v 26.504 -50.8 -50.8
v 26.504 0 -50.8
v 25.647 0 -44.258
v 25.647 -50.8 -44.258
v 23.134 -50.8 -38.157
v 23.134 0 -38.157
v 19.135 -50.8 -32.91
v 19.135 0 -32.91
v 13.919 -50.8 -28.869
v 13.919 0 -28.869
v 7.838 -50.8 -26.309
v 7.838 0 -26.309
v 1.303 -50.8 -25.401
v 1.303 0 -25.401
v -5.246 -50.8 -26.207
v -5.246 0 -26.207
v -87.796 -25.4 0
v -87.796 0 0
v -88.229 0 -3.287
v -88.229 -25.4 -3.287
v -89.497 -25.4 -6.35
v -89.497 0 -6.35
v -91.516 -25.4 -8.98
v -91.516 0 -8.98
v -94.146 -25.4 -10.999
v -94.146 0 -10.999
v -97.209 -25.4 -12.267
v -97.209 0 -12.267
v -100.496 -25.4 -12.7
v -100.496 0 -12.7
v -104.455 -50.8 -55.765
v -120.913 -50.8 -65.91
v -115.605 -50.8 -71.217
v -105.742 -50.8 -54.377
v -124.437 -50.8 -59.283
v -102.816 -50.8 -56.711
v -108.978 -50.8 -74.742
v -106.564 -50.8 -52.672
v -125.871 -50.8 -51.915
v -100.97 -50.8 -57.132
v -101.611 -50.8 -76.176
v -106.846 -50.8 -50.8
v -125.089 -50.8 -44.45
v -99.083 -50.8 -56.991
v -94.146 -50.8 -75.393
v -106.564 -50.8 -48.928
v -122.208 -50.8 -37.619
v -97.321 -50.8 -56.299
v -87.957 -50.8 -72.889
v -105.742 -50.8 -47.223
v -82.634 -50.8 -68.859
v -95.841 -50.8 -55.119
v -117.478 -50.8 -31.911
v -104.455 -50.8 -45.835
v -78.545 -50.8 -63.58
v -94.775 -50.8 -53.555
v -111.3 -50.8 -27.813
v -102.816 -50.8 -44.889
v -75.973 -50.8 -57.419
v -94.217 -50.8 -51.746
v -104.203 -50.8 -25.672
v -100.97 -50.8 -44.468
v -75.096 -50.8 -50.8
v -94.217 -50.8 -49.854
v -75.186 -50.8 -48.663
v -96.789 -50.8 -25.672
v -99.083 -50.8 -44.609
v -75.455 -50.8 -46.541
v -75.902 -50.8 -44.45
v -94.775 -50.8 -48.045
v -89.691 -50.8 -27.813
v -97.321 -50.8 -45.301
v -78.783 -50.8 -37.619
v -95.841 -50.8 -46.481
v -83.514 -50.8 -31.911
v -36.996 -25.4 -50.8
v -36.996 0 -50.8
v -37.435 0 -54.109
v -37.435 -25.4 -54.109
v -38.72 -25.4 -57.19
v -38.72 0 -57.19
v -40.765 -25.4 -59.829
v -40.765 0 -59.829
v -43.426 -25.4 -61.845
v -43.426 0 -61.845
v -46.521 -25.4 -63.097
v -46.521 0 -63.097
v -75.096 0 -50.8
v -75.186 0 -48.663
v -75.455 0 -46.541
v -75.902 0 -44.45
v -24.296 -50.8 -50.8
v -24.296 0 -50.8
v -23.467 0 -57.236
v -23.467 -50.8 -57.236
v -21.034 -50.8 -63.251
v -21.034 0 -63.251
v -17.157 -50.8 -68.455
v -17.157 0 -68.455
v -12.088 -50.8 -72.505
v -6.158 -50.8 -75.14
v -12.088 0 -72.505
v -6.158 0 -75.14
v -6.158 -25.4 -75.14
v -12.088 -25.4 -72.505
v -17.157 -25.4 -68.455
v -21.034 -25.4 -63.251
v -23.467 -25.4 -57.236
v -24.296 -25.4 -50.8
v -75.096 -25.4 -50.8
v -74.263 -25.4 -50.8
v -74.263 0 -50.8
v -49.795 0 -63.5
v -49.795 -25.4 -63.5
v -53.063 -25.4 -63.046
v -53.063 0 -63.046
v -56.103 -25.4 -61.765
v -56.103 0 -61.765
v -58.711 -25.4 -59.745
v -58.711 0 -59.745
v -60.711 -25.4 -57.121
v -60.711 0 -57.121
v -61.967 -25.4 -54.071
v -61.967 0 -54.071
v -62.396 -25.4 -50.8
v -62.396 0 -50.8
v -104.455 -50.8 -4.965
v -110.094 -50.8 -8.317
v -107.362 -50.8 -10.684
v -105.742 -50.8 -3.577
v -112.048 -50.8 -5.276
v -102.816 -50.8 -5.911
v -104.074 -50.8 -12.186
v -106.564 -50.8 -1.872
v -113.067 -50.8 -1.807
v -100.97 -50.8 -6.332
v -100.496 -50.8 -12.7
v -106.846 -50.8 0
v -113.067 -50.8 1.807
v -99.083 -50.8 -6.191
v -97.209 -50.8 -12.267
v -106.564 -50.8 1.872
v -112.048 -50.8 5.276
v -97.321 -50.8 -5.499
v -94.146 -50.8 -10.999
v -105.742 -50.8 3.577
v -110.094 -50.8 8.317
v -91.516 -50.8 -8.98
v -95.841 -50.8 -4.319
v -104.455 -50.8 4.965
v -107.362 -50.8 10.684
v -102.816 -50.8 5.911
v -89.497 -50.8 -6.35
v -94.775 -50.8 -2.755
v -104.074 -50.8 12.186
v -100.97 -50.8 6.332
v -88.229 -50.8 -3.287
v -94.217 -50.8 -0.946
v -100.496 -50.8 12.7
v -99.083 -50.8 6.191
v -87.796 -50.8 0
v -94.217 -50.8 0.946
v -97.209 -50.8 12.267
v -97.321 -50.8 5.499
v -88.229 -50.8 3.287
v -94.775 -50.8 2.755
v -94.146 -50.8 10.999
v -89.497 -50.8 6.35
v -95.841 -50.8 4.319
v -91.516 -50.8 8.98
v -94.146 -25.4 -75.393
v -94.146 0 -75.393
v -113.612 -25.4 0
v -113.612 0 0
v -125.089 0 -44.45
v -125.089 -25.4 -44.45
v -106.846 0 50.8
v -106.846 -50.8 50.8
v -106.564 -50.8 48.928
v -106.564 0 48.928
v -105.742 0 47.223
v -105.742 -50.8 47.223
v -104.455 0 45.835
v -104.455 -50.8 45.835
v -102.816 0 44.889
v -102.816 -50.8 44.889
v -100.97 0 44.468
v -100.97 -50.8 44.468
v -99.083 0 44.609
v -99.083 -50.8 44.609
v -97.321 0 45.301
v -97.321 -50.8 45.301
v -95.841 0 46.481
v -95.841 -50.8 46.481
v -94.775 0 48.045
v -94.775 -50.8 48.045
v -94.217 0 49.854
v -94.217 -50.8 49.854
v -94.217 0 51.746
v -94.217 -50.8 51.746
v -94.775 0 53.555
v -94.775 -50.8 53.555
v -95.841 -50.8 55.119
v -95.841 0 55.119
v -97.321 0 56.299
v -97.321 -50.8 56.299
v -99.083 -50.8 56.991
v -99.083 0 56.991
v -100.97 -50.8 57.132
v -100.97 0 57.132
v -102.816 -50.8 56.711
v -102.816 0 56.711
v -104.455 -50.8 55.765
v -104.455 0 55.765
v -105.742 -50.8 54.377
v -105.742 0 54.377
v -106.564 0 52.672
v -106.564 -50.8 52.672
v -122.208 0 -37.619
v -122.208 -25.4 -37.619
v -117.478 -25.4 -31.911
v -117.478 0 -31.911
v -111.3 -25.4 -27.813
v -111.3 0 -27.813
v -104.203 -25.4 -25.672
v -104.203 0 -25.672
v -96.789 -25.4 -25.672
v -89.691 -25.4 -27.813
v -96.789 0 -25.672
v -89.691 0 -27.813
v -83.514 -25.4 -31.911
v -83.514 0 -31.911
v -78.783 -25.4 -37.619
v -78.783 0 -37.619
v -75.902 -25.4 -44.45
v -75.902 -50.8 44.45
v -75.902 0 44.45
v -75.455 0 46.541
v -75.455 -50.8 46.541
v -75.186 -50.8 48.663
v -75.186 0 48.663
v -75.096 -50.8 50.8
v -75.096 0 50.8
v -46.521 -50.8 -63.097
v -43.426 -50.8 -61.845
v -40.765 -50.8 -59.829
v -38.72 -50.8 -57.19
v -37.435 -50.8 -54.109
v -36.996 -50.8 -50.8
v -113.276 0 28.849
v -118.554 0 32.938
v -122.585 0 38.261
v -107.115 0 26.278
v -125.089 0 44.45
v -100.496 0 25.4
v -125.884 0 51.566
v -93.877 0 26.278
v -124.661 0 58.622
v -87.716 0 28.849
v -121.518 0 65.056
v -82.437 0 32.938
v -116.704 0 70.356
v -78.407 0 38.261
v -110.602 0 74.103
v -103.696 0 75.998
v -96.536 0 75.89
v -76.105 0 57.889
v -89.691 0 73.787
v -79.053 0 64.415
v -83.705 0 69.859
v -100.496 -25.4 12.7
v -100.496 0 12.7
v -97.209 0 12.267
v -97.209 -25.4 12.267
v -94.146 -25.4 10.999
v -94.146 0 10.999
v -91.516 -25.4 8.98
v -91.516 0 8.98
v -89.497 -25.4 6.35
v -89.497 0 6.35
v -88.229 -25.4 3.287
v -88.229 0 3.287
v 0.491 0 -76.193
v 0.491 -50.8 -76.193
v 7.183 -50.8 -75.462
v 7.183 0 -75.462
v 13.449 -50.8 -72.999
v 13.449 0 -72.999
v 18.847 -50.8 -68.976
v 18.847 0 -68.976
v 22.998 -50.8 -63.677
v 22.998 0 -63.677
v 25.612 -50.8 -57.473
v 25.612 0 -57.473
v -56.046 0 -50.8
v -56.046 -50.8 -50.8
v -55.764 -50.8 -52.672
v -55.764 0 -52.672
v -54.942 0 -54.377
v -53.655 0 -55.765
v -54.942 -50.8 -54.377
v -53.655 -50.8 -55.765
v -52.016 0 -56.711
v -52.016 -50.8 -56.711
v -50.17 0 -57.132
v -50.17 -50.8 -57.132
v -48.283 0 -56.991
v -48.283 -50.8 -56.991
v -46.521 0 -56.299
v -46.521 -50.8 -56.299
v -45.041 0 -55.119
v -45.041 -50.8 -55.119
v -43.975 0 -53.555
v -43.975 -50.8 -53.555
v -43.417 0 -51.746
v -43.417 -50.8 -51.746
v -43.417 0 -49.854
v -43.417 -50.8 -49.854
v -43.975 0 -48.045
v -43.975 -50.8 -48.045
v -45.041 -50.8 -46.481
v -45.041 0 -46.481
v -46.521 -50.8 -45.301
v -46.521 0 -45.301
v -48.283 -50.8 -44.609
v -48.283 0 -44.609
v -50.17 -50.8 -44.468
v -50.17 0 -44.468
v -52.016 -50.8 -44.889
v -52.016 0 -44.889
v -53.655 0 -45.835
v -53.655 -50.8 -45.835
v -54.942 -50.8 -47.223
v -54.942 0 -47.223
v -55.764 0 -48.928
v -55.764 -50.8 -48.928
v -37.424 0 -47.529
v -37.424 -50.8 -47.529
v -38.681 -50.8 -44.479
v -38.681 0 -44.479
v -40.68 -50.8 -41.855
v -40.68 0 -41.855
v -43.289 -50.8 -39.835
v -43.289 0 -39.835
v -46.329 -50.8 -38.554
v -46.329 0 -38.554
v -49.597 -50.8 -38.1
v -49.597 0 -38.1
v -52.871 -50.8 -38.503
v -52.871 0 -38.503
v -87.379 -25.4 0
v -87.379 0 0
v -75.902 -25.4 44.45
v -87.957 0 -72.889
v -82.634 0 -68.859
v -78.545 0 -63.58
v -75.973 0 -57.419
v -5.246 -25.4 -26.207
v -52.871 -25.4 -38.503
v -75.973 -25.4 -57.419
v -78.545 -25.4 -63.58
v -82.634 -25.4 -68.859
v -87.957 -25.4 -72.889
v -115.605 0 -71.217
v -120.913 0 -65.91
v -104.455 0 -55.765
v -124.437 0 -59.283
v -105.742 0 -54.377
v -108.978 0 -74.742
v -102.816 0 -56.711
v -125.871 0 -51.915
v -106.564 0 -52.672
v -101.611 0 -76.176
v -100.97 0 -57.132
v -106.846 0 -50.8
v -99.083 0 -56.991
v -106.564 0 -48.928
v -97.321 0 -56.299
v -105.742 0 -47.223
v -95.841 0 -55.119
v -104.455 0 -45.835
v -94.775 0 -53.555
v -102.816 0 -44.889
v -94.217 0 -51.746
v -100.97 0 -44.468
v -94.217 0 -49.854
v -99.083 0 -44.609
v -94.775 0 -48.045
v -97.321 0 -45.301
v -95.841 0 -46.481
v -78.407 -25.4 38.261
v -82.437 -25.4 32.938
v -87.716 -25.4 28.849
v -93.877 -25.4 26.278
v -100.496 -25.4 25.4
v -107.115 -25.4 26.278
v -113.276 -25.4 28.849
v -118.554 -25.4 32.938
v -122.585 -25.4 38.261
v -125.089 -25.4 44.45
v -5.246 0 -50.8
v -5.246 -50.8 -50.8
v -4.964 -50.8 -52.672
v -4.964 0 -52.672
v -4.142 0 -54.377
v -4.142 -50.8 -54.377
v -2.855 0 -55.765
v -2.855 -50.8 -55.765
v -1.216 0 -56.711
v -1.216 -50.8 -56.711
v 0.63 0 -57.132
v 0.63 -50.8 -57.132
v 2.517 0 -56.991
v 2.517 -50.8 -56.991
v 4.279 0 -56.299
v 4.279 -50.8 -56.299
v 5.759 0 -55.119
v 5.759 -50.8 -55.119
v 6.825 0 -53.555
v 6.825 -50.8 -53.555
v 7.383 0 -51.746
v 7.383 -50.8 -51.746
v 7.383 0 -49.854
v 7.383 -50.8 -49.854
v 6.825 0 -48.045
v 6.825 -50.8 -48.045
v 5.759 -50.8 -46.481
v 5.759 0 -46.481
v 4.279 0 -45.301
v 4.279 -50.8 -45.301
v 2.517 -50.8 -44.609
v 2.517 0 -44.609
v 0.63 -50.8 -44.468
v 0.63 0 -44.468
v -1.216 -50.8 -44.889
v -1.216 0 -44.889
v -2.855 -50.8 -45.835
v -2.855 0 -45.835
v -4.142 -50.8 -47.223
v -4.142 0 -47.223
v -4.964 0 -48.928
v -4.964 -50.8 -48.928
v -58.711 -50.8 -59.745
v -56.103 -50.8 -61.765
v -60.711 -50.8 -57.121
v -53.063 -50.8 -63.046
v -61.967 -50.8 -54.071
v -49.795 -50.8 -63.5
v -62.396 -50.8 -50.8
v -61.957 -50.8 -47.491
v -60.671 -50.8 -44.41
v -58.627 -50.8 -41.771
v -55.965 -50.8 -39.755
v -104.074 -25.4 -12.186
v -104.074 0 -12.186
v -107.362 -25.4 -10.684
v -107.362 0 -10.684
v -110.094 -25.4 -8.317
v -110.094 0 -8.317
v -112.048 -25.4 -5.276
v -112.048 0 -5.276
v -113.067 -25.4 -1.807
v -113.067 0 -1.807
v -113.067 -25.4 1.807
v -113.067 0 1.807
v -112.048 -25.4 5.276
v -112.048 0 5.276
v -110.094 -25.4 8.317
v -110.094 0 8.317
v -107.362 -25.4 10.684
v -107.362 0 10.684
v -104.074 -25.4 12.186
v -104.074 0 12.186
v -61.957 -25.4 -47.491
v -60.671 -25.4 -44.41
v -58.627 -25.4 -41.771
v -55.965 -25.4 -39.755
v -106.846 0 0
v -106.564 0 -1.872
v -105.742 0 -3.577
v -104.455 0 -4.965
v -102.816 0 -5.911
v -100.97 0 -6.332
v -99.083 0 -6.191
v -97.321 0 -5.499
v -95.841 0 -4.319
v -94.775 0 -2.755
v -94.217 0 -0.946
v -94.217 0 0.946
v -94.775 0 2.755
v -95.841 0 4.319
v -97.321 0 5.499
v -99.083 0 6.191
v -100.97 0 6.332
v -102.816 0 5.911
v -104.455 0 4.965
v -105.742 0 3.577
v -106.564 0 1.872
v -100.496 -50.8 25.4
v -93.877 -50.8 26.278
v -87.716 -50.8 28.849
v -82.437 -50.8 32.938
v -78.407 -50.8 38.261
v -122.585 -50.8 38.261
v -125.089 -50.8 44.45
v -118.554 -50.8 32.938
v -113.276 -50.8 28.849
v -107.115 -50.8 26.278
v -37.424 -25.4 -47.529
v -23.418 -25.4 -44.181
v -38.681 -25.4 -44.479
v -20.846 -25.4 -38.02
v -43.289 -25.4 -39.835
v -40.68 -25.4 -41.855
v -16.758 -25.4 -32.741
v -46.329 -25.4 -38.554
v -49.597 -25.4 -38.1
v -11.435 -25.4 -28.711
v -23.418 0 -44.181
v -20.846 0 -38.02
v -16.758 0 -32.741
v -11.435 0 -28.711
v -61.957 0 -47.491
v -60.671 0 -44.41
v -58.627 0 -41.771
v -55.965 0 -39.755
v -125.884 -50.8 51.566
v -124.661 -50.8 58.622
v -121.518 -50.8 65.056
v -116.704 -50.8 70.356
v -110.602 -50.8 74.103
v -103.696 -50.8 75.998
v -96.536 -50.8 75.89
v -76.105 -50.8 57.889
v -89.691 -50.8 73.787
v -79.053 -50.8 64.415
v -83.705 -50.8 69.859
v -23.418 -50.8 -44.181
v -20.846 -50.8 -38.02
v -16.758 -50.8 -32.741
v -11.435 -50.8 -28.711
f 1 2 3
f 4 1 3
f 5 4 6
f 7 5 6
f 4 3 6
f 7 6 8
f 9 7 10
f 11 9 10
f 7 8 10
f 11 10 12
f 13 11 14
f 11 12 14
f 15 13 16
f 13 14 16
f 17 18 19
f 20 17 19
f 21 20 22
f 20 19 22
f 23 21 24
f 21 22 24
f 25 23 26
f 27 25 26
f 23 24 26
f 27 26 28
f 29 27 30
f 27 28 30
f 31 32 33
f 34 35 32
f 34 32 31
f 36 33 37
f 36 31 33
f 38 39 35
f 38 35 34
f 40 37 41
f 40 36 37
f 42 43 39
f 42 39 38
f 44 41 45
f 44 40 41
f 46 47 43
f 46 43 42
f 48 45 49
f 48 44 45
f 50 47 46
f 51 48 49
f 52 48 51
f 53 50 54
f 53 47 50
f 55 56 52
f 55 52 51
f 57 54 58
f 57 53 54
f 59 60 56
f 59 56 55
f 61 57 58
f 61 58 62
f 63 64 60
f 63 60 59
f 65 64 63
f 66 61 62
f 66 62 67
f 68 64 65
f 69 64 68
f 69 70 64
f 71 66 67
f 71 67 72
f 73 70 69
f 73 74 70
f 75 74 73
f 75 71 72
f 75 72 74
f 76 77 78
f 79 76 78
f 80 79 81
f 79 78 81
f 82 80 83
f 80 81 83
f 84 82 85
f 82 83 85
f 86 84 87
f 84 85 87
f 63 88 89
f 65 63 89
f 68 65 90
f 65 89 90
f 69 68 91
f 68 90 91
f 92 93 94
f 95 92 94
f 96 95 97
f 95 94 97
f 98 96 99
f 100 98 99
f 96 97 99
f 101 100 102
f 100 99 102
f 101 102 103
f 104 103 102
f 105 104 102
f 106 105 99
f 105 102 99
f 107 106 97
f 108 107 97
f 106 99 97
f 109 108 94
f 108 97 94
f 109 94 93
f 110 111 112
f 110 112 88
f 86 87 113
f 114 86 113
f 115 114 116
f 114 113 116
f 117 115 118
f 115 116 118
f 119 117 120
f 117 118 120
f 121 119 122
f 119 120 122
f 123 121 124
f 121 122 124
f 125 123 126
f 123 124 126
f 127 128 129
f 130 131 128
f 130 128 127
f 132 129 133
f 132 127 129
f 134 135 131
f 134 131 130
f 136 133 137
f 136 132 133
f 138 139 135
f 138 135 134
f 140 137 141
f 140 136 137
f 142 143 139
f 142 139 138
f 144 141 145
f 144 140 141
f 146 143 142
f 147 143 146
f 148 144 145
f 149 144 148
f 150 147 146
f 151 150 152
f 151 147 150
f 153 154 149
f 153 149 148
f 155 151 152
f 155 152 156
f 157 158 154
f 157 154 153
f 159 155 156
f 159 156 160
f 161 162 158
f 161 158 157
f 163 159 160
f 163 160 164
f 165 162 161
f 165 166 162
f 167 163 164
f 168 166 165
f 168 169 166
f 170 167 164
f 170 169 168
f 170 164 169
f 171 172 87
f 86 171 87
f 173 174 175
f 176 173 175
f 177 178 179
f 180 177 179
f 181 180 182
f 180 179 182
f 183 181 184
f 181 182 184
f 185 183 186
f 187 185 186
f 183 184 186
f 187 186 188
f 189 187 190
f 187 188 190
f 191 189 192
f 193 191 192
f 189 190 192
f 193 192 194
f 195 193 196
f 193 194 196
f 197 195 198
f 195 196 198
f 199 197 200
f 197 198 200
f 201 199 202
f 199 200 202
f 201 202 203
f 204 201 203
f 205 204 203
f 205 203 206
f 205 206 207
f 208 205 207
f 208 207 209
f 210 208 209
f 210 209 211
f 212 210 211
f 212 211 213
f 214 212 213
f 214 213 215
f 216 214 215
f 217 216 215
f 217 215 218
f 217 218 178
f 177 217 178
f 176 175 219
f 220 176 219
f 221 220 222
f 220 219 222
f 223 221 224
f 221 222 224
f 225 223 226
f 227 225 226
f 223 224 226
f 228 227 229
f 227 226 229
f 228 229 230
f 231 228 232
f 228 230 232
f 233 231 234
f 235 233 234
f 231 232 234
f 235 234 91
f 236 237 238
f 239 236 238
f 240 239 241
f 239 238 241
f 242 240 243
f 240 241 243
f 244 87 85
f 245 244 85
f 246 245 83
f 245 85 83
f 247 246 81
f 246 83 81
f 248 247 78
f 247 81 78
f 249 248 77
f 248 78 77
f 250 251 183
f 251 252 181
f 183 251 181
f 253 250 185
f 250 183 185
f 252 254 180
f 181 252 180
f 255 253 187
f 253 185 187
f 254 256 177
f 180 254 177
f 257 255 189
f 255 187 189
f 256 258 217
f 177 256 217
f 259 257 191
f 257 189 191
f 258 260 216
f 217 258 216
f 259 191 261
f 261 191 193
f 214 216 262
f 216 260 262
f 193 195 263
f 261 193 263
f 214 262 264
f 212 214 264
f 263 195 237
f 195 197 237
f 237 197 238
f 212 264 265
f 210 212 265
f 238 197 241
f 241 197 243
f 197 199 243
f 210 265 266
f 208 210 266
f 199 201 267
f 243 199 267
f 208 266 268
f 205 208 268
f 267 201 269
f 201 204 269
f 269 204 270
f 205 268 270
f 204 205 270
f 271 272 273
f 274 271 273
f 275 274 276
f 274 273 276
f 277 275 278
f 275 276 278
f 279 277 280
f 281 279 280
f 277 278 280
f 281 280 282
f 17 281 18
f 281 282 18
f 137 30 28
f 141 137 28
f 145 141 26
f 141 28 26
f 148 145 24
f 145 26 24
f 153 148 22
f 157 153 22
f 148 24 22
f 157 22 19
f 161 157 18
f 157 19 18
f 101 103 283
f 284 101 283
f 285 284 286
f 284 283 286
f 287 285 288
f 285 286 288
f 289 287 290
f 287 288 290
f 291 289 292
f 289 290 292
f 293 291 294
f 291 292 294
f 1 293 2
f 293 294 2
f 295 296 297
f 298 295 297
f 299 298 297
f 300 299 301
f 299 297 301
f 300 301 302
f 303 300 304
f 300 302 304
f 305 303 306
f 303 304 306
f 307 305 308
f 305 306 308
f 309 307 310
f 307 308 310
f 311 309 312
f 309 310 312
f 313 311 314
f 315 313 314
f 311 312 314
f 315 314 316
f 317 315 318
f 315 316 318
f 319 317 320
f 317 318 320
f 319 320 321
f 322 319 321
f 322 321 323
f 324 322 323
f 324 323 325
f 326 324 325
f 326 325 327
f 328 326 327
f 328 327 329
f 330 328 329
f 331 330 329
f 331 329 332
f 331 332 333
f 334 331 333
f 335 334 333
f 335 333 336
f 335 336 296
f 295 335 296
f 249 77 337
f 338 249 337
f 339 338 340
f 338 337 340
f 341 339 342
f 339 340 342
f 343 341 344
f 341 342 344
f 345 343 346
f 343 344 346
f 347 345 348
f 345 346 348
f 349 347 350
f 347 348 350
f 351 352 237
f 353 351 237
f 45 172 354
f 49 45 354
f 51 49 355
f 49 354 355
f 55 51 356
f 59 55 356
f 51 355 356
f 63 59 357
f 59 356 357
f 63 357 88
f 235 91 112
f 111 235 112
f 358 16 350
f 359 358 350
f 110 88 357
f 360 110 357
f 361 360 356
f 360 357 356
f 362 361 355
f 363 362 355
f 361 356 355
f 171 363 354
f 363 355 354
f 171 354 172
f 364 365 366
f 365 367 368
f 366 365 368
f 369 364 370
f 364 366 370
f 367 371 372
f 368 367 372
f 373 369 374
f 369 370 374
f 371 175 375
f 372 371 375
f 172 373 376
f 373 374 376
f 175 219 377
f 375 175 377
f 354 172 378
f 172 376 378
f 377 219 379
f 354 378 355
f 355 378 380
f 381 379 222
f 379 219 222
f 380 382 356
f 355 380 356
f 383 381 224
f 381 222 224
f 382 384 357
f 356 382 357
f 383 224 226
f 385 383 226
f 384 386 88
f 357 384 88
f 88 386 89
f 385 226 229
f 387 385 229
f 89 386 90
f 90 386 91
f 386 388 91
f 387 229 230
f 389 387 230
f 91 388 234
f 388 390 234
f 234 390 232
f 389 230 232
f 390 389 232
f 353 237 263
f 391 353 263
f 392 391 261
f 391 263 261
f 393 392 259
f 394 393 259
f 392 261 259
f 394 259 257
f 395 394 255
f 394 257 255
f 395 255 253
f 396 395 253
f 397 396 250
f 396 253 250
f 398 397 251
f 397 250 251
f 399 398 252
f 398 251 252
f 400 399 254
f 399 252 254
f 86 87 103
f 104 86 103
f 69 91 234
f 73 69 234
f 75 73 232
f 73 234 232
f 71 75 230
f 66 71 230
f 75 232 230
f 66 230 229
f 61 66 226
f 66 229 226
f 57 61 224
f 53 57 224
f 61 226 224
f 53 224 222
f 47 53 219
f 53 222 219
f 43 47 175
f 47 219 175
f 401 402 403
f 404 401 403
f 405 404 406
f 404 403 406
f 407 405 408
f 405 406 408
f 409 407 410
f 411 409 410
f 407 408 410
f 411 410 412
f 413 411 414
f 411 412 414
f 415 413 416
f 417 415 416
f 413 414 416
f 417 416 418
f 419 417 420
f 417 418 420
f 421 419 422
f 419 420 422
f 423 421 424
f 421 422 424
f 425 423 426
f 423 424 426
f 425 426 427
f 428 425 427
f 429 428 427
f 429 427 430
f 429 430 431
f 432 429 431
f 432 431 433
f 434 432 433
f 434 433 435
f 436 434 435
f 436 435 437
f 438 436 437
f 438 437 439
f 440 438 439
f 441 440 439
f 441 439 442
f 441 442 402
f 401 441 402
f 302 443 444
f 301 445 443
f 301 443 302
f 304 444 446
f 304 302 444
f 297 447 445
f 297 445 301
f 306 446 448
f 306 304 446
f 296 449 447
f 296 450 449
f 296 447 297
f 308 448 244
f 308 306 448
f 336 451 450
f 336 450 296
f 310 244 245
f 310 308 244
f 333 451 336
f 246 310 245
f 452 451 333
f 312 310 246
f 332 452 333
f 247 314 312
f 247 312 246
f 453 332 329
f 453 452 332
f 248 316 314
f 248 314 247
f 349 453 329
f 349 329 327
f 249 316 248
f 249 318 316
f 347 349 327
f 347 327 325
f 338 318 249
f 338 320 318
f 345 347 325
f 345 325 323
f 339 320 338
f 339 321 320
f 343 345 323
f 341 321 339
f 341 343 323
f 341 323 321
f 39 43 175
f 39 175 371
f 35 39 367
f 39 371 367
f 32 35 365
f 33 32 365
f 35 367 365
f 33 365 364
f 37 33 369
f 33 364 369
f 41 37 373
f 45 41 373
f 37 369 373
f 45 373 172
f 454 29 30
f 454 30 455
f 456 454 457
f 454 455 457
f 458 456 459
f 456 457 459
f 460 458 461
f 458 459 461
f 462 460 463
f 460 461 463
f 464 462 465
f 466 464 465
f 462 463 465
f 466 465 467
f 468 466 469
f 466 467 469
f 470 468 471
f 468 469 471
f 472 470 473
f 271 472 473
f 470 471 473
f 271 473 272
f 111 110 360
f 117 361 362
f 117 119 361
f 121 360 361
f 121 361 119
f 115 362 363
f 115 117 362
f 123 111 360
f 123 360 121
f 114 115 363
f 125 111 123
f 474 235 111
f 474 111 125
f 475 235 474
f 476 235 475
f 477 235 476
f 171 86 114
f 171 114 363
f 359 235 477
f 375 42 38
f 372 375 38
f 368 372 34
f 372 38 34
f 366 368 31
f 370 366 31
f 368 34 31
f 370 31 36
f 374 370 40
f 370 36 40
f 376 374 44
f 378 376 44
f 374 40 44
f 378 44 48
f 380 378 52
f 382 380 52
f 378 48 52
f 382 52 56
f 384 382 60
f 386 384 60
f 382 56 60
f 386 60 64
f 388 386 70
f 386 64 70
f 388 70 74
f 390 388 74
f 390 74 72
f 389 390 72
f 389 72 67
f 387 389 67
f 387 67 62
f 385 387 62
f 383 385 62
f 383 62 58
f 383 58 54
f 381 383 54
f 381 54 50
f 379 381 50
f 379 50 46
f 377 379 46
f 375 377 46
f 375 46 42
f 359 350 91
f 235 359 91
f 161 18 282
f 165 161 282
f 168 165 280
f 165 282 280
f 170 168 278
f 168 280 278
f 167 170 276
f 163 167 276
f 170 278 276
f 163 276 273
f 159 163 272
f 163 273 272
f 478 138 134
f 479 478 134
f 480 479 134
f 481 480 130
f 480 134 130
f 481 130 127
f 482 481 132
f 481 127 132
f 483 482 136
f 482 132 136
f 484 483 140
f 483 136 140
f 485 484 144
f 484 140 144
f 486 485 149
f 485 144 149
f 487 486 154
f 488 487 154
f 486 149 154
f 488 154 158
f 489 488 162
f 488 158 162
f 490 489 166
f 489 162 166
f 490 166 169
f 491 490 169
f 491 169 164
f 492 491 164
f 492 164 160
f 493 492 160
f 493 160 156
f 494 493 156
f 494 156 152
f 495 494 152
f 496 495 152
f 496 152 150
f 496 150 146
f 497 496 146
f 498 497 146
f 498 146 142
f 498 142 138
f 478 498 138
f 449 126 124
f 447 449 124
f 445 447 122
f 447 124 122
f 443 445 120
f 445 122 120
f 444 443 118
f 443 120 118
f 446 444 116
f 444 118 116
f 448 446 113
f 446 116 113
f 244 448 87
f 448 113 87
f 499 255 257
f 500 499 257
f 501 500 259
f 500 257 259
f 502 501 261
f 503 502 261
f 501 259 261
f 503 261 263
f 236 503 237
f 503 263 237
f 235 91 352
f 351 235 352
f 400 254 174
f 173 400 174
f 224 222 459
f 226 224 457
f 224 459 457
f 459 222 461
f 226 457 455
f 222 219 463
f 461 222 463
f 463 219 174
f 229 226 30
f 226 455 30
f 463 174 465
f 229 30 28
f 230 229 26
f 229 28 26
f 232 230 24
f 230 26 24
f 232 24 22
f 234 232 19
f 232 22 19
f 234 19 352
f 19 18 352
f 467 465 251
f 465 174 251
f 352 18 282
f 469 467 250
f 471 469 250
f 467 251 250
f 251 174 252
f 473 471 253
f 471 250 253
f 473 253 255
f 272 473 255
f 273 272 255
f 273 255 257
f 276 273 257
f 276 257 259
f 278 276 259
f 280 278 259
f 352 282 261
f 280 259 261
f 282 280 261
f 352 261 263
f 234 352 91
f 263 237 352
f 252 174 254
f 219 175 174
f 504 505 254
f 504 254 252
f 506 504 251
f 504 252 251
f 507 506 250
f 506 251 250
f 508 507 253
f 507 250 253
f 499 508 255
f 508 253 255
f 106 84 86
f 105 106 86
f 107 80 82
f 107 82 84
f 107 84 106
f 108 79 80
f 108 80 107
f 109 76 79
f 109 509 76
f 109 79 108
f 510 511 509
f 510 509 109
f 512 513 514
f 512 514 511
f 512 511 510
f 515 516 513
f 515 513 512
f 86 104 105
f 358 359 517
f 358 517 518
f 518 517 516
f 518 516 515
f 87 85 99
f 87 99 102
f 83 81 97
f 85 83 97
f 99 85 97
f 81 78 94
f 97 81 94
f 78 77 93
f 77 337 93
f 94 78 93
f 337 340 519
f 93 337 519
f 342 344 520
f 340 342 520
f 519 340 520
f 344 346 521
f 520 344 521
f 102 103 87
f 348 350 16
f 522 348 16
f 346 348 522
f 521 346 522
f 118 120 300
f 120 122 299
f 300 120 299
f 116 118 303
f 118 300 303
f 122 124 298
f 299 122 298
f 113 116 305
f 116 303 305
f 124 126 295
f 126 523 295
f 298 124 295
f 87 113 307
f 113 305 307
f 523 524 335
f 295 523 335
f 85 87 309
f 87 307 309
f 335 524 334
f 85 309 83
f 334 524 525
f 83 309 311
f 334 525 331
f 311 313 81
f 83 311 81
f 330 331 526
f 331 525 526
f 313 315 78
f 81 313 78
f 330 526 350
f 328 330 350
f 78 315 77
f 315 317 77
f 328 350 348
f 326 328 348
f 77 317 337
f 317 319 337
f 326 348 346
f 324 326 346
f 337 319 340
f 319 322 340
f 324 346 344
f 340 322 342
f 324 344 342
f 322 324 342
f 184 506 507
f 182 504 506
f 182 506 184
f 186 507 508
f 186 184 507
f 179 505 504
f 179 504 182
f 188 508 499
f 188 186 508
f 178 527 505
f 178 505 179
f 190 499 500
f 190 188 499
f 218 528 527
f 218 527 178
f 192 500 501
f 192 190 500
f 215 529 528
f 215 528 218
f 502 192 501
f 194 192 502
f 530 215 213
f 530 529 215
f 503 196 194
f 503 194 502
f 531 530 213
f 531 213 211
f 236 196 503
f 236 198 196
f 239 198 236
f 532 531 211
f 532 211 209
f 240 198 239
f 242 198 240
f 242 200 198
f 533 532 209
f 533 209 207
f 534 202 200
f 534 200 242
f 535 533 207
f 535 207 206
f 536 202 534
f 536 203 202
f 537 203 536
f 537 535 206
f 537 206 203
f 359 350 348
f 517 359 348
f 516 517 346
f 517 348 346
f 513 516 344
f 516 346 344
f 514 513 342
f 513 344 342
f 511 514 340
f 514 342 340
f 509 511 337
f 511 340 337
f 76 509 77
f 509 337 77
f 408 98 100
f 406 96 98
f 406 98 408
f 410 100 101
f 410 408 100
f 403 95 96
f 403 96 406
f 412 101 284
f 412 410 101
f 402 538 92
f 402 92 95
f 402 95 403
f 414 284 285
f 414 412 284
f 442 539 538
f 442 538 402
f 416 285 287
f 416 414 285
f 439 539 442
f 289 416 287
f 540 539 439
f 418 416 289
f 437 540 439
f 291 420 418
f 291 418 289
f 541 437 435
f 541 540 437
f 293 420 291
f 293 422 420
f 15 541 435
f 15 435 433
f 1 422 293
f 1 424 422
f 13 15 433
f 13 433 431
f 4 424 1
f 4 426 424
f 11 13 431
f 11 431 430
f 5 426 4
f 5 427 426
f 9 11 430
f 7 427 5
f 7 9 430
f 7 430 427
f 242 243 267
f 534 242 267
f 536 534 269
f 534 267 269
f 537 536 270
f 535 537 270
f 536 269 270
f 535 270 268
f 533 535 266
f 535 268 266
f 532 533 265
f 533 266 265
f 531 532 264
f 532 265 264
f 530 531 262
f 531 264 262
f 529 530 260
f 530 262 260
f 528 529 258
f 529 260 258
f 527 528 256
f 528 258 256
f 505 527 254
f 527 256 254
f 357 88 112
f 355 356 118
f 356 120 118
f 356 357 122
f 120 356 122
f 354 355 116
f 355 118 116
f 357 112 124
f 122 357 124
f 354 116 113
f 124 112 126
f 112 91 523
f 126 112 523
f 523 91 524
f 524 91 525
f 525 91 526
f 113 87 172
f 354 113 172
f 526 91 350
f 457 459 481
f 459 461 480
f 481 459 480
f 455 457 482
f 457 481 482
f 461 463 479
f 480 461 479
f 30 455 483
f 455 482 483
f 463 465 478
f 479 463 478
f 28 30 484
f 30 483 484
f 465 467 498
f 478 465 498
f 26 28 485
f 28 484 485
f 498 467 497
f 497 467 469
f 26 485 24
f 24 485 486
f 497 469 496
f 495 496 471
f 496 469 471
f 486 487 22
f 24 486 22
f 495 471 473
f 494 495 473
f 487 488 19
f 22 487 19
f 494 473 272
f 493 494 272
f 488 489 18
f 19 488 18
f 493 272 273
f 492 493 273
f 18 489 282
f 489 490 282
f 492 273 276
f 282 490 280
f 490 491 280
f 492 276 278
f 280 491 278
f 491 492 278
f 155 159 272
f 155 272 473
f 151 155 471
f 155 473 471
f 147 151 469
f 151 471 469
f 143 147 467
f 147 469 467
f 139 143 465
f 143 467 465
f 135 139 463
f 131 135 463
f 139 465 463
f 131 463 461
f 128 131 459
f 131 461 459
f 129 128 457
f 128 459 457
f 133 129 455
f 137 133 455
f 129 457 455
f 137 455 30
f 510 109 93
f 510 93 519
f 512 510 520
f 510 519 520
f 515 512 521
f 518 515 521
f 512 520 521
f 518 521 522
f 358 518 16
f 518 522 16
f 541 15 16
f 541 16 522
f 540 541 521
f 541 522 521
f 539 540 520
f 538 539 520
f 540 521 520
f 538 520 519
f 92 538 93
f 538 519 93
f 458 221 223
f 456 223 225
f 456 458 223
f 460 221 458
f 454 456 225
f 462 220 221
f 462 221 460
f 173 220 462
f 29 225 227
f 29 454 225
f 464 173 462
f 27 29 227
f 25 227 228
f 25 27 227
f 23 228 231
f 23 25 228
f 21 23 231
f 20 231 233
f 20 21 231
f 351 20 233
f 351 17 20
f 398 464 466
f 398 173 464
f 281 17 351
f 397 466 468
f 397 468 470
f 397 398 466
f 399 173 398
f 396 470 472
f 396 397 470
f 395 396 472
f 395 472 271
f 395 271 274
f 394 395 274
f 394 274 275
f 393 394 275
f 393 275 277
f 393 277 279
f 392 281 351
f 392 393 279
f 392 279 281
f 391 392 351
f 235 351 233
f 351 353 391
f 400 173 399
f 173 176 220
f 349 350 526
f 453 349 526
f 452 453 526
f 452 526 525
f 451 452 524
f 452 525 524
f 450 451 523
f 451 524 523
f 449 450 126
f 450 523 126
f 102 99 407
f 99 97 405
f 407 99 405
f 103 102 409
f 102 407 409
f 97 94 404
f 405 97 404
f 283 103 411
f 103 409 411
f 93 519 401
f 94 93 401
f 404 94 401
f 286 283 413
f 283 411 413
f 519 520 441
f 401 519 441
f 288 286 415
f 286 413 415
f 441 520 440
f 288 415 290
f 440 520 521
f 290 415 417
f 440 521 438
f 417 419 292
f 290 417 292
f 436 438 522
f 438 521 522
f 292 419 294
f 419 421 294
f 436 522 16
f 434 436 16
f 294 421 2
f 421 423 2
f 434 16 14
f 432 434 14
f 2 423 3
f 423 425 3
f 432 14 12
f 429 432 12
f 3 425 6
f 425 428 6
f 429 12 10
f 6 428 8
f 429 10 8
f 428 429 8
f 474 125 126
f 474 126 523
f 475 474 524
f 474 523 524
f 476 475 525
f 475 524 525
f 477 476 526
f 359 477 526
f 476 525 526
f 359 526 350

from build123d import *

# Parameters (mm, degrees)
F1_DEPTH = 50.8
F2_DEPTH = 25.4
F3_D     = 12.7
F3_2_D   = 12.7
F3_3_D   = 12.7
F3_4_D   = 12.7
F3_5_D   = 12.7


with BuildPart() as f1:
    # F0 (on Front) → F1 (new body)
    with BuildSketch(Plane.XZ):
        with BuildLine():
            ThreePointArc((-100.4957760886, 25.4), (-84.9415162219, 30.7195368579), (-75.9023318401, 44.45))
            ThreePointArc((-75.9023318401, 44.45), (-75.2982218034, 47.5994909709), (-75.0957760886, 50.8))
            ThreePointArc((-75.0957760886, 50.8), (-103.6962847293, 75.9975543345), (-125.0892205327, 44.4500007579))
            ThreePointArc((-125.0892205327, 44.4500007579), (-116.0500362647, 30.7195370976), (-100.4957760886, 25.4))
        make_face()
    extrude(amount=F1_DEPTH)

    # F3 (through all)
    with Locations(Plane(origin=(0, 0, 0), x_dir=(1, 0, 0), z_dir=(0, 1, 0))):
        with Locations((-100.4957760886, -50.8), (-100.4957760886, 50.8), (-100.4957760886, 0), (-49.6957760886, 50.8), (1.1042239114, 50.8)):
            Hole(F3_D / 2)


with BuildPart() as f1b:
    # F0 (on Front) → F1, piece 2 (new body)
    with BuildSketch(Plane.XZ):
        with BuildLine():
            ThreePointArc((-100.4957760886, 12.7), (-113.1957760886, 0), (-100.4957760886, -12.7))
            Line((-100.4957760886, -12.7), (-100.4957760886, 0))
            Line((-100.4957760886, 0), (-100.4957760886, 12.7))
        make_face()
        with BuildLine():
            Line((-100.4957760886, 0), (-100.4957760886, -12.7))
            ThreePointArc((-100.4957760886, -12.7), (-91.5155199675, -8.9802561211), (-87.7957760886, 0))
            ThreePointArc((-87.7957760886, 0), (-91.5155199675, 8.9802561211), (-100.4957760886, 12.7))
            Line((-100.4957760886, 12.7), (-100.4957760886, 0))
        make_face()
    extrude(amount=F1_DEPTH)

    # F3#2 (through all)
    with Locations(Plane(origin=(0, 0, 0), x_dir=(1, 0, 0), z_dir=(0, 1, 0))):
        with Locations((-100.4957760886, -50.8), (-100.4957760886, 50.8), (-100.4957760886, 0), (-49.6957760886, 50.8), (1.1042239114, 50.8)):
            Hole(F3_2_D / 2)


with BuildPart() as f1c:
    # F0 (on Front) → F1, piece 3 (new body)
    with BuildSketch(Plane.XZ):
        with BuildLine():
            Line((-100.4957760886, -25.4), (-100.4957760886, -50.8))
            Line((-100.4957760886, -50.8), (-75.0957760886, -50.8))
            ThreePointArc((-75.0957760886, -50.8), (-75.2982218034, -47.5994909709), (-75.9023318401, -44.45))
            ThreePointArc((-75.9023318401, -44.45), (-84.9415162219, -30.7195368579), (-100.4957760886, -25.4))
        make_face()
        with BuildLine():
            Line((-75.0957760886, -50.8), (-100.4957760886, -50.8))
            Line((-100.4957760886, -50.8), (-100.4957760886, -25.4))
            ThreePointArc((-100.4957760886, -25.4), (-116.0500359552, -30.7195368579), (-125.089220337, -44.45))
            ThreePointArc((-125.089220337, -44.45), (-118.4562883307, -68.7605122421), (-94.1457760886, -75.3934442484))
            ThreePointArc((-94.1457760886, -75.3934442484), (-80.4153129465, -66.3542598667), (-75.0957760886, -50.8))
        make_face()
    extrude(amount=F1_DEPTH)

    # F3#3 (through all)
    with Locations(Plane(origin=(0, 0, 0), x_dir=(1, 0, 0), z_dir=(0, 1, 0))):
        with Locations((-100.4957760886, -50.8), (-100.4957760886, 50.8), (-100.4957760886, 0), (-49.6957760886, 50.8), (1.1042239114, 50.8)):
            Hole(F3_3_D / 2)


with BuildPart() as f1d:
    # F0 (on Front) → F1, piece 4 (new body)
    with BuildSketch(Plane.XZ):
        with BuildLine():
            Line((-49.6957760886, -50.8), (-62.3957760886, -50.8))
            ThreePointArc((-62.3957760886, -50.8), (-57.4729060219, -60.840231571), (-46.5207760886, -63.0967221242))
            ThreePointArc((-46.5207760886, -63.0967221242), (-39.6555445175, -58.5771299333), (-36.9957760886, -50.8))
            Line((-36.9957760886, -50.8), (-49.6957760886, -50.8))
        make_face()
        with BuildLine():
            ThreePointArc((-52.8707760886, -38.5032778758), (-59.7360076596, -43.0228700667), (-62.3957760886, -50.8))
            Line((-62.3957760886, -50.8), (-49.6957760886, -50.8))
            Line((-49.6957760886, -50.8), (-36.9957760886, -50.8))
            ThreePointArc((-36.9957760886, -50.8), (-41.9186461552, -40.759768429), (-52.8707760886, -38.5032778758))
        make_face()
    extrude(amount=F1_DEPTH)

    # F3#4 (through all)
    with Locations(Plane(origin=(0, 0, 0), x_dir=(1, 0, 0), z_dir=(0, 1, 0))):
        with Locations((-100.4957760886, -50.8), (-100.4957760886, 50.8), (-100.4957760886, 0), (-49.6957760886, 50.8), (1.1042239114, 50.8)):
            Hole(F3_4_D / 2)


with BuildPart() as f1e:
    # F0 (on Front) → F1, piece 5 (new body)
    with BuildSketch(Plane.XZ):
        with BuildLine():
            ThreePointArc((26.5042239114, -50.8), (16.6584835721, -30.7195366984), (-5.2457765931, -26.2065558819))
            ThreePointArc((-5.2457765931, -26.2065558819), (-18.9762393902, -35.2457403393), (-24.2957760886, -50.8))
            ThreePointArc((-24.2957760886, -50.8), (-19.2626548825, -65.9772938363), (-6.1579612702, -75.1396932271))
            ThreePointArc((-6.1579612702, -75.1396932271), (16.2815177477, -71.1668787939), (26.5042239114, -50.8))
        make_face()
    extrude(amount=F1_DEPTH)

    # F3#5 (through all)
    with Locations(Plane(origin=(0, 0, 0), x_dir=(1, 0, 0), z_dir=(0, 1, 0))):
        with Locations((-100.4957760886, -50.8), (-100.4957760886, 50.8), (-100.4957760886, 0), (-49.6957760886, 50.8), (1.1042239114, 50.8)):
            Hole(F3_5_D / 2)


with BuildPart() as f2:
    # F0 (on Front) → F2 (new body)
    with BuildSketch(Plane.XZ):
        with BuildLine():
            ThreePointArc((-125.089220337, -44.45), (-116.0500359552, -30.7195368579), (-100.4957760886, -25.4))
            Line((-100.4957760886, -25.4), (-100.4957760886, -12.7))
            ThreePointArc((-100.4957760886, -12.7), (-113.1957760886, 0), (-100.4957760886, 12.7))
            Line((-100.4957760886, 12.7), (-100.4957760886, 25.4))
            ThreePointArc((-100.4957760886, 25.4), (-116.0500362647, 30.7195370976), (-125.0892205327, 44.4500007579))
            Line((-125.0892205327, 44.4500007579), (-113.6122796877, 0))
            Line((-113.6122796877, 0), (-125.089220337, -44.45))
        make_face()
        with BuildLine():
            Line((-100.4957760886, -12.7), (-100.4957760886, -25.4))
            ThreePointArc((-100.4957760886, -25.4), (-84.9415162219, -30.7195368579), (-75.9023318401, -44.45))
            Line((-75.9023318401, -44.45), (-87.3792724894, 0))
            Line((-87.3792724894, 0), (-75.9023318401, 44.45))
            ThreePointArc((-75.9023318401, 44.45), (-84.9415162219, 30.7195368579), (-100.4957760886, 25.4))
            Line((-100.4957760886, 25.4), (-100.4957760886, 12.7))
            ThreePointArc((-100.4957760886, 12.7), (-91.5155199675, 8.9802561211), (-87.7957760886, 0))
            ThreePointArc((-87.7957760886, 0), (-91.5155199675, -8.9802561211), (-100.4957760886, -12.7))
        make_face()
    extrude(amount=F2_DEPTH)


with BuildPart() as f2b:
    # F0 (on Front) → F2, piece 2 (new body)
    with BuildSketch(Plane.XZ):
        with BuildLine():
            Line((-74.2627688902, -50.8), (-75.0957760886, -50.8))
            ThreePointArc((-75.0957760886, -50.8), (-80.4153129465, -66.3542598667), (-94.1457760886, -75.3934442484))
            Line((-94.1457760886, -75.3934442484), (-46.5207760886, -63.0967221242))
            ThreePointArc((-46.5207760886, -63.0967221242), (-57.4729060219, -60.840231571), (-62.3957760886, -50.8))
            Line((-62.3957760886, -50.8), (-74.2627688902, -50.8))
        make_face()
        with BuildLine():
            Line((-75.9023318401, -44.45), (-74.2627688902, -50.8))
            Line((-74.2627688902, -50.8), (-62.3957760886, -50.8))
            ThreePointArc((-62.3957760886, -50.8), (-59.7360076596, -43.0228700667), (-52.8707760886, -38.5032778758))
            Line((-52.8707760886, -38.5032778758), (-75.9023318401, -44.45))
        make_face()
    extrude(amount=F2_DEPTH)


with BuildPart() as f2c:
    # F0 (on Front) → F2, piece 3 (new body)
    with BuildSketch(Plane.XZ):
        with BuildLine():
            ThreePointArc((-36.9957760886, -50.8), (-39.6555445175, -58.5771299333), (-46.5207760886, -63.0967221242))
            Line((-46.5207760886, -63.0967221242), (-6.1579612702, -75.1396932271))
            ThreePointArc((-6.1579612702, -75.1396932271), (-19.2626548825, -65.9772938363), (-24.2957760886, -50.8))
            Line((-24.2957760886, -50.8), (-36.9957760886, -50.8))
        make_face()
        with BuildLine():
            Line((-5.2457765931, -26.2065558819), (-52.8707760886, -38.5032778758))
            ThreePointArc((-52.8707760886, -38.5032778758), (-41.9186461552, -40.759768429), (-36.9957760886, -50.8))
            Line((-36.9957760886, -50.8), (-24.2957760886, -50.8))
            ThreePointArc((-24.2957760886, -50.8), (-18.9762393902, -35.2457403393), (-5.2457765931, -26.2065558819))
        make_face()
    extrude(amount=F2_DEPTH)


solid = Compound([f1.part, f1b.part, f1c.part, f1d.part, f1e.part, f2.part, f2b.part, f2c.part])
